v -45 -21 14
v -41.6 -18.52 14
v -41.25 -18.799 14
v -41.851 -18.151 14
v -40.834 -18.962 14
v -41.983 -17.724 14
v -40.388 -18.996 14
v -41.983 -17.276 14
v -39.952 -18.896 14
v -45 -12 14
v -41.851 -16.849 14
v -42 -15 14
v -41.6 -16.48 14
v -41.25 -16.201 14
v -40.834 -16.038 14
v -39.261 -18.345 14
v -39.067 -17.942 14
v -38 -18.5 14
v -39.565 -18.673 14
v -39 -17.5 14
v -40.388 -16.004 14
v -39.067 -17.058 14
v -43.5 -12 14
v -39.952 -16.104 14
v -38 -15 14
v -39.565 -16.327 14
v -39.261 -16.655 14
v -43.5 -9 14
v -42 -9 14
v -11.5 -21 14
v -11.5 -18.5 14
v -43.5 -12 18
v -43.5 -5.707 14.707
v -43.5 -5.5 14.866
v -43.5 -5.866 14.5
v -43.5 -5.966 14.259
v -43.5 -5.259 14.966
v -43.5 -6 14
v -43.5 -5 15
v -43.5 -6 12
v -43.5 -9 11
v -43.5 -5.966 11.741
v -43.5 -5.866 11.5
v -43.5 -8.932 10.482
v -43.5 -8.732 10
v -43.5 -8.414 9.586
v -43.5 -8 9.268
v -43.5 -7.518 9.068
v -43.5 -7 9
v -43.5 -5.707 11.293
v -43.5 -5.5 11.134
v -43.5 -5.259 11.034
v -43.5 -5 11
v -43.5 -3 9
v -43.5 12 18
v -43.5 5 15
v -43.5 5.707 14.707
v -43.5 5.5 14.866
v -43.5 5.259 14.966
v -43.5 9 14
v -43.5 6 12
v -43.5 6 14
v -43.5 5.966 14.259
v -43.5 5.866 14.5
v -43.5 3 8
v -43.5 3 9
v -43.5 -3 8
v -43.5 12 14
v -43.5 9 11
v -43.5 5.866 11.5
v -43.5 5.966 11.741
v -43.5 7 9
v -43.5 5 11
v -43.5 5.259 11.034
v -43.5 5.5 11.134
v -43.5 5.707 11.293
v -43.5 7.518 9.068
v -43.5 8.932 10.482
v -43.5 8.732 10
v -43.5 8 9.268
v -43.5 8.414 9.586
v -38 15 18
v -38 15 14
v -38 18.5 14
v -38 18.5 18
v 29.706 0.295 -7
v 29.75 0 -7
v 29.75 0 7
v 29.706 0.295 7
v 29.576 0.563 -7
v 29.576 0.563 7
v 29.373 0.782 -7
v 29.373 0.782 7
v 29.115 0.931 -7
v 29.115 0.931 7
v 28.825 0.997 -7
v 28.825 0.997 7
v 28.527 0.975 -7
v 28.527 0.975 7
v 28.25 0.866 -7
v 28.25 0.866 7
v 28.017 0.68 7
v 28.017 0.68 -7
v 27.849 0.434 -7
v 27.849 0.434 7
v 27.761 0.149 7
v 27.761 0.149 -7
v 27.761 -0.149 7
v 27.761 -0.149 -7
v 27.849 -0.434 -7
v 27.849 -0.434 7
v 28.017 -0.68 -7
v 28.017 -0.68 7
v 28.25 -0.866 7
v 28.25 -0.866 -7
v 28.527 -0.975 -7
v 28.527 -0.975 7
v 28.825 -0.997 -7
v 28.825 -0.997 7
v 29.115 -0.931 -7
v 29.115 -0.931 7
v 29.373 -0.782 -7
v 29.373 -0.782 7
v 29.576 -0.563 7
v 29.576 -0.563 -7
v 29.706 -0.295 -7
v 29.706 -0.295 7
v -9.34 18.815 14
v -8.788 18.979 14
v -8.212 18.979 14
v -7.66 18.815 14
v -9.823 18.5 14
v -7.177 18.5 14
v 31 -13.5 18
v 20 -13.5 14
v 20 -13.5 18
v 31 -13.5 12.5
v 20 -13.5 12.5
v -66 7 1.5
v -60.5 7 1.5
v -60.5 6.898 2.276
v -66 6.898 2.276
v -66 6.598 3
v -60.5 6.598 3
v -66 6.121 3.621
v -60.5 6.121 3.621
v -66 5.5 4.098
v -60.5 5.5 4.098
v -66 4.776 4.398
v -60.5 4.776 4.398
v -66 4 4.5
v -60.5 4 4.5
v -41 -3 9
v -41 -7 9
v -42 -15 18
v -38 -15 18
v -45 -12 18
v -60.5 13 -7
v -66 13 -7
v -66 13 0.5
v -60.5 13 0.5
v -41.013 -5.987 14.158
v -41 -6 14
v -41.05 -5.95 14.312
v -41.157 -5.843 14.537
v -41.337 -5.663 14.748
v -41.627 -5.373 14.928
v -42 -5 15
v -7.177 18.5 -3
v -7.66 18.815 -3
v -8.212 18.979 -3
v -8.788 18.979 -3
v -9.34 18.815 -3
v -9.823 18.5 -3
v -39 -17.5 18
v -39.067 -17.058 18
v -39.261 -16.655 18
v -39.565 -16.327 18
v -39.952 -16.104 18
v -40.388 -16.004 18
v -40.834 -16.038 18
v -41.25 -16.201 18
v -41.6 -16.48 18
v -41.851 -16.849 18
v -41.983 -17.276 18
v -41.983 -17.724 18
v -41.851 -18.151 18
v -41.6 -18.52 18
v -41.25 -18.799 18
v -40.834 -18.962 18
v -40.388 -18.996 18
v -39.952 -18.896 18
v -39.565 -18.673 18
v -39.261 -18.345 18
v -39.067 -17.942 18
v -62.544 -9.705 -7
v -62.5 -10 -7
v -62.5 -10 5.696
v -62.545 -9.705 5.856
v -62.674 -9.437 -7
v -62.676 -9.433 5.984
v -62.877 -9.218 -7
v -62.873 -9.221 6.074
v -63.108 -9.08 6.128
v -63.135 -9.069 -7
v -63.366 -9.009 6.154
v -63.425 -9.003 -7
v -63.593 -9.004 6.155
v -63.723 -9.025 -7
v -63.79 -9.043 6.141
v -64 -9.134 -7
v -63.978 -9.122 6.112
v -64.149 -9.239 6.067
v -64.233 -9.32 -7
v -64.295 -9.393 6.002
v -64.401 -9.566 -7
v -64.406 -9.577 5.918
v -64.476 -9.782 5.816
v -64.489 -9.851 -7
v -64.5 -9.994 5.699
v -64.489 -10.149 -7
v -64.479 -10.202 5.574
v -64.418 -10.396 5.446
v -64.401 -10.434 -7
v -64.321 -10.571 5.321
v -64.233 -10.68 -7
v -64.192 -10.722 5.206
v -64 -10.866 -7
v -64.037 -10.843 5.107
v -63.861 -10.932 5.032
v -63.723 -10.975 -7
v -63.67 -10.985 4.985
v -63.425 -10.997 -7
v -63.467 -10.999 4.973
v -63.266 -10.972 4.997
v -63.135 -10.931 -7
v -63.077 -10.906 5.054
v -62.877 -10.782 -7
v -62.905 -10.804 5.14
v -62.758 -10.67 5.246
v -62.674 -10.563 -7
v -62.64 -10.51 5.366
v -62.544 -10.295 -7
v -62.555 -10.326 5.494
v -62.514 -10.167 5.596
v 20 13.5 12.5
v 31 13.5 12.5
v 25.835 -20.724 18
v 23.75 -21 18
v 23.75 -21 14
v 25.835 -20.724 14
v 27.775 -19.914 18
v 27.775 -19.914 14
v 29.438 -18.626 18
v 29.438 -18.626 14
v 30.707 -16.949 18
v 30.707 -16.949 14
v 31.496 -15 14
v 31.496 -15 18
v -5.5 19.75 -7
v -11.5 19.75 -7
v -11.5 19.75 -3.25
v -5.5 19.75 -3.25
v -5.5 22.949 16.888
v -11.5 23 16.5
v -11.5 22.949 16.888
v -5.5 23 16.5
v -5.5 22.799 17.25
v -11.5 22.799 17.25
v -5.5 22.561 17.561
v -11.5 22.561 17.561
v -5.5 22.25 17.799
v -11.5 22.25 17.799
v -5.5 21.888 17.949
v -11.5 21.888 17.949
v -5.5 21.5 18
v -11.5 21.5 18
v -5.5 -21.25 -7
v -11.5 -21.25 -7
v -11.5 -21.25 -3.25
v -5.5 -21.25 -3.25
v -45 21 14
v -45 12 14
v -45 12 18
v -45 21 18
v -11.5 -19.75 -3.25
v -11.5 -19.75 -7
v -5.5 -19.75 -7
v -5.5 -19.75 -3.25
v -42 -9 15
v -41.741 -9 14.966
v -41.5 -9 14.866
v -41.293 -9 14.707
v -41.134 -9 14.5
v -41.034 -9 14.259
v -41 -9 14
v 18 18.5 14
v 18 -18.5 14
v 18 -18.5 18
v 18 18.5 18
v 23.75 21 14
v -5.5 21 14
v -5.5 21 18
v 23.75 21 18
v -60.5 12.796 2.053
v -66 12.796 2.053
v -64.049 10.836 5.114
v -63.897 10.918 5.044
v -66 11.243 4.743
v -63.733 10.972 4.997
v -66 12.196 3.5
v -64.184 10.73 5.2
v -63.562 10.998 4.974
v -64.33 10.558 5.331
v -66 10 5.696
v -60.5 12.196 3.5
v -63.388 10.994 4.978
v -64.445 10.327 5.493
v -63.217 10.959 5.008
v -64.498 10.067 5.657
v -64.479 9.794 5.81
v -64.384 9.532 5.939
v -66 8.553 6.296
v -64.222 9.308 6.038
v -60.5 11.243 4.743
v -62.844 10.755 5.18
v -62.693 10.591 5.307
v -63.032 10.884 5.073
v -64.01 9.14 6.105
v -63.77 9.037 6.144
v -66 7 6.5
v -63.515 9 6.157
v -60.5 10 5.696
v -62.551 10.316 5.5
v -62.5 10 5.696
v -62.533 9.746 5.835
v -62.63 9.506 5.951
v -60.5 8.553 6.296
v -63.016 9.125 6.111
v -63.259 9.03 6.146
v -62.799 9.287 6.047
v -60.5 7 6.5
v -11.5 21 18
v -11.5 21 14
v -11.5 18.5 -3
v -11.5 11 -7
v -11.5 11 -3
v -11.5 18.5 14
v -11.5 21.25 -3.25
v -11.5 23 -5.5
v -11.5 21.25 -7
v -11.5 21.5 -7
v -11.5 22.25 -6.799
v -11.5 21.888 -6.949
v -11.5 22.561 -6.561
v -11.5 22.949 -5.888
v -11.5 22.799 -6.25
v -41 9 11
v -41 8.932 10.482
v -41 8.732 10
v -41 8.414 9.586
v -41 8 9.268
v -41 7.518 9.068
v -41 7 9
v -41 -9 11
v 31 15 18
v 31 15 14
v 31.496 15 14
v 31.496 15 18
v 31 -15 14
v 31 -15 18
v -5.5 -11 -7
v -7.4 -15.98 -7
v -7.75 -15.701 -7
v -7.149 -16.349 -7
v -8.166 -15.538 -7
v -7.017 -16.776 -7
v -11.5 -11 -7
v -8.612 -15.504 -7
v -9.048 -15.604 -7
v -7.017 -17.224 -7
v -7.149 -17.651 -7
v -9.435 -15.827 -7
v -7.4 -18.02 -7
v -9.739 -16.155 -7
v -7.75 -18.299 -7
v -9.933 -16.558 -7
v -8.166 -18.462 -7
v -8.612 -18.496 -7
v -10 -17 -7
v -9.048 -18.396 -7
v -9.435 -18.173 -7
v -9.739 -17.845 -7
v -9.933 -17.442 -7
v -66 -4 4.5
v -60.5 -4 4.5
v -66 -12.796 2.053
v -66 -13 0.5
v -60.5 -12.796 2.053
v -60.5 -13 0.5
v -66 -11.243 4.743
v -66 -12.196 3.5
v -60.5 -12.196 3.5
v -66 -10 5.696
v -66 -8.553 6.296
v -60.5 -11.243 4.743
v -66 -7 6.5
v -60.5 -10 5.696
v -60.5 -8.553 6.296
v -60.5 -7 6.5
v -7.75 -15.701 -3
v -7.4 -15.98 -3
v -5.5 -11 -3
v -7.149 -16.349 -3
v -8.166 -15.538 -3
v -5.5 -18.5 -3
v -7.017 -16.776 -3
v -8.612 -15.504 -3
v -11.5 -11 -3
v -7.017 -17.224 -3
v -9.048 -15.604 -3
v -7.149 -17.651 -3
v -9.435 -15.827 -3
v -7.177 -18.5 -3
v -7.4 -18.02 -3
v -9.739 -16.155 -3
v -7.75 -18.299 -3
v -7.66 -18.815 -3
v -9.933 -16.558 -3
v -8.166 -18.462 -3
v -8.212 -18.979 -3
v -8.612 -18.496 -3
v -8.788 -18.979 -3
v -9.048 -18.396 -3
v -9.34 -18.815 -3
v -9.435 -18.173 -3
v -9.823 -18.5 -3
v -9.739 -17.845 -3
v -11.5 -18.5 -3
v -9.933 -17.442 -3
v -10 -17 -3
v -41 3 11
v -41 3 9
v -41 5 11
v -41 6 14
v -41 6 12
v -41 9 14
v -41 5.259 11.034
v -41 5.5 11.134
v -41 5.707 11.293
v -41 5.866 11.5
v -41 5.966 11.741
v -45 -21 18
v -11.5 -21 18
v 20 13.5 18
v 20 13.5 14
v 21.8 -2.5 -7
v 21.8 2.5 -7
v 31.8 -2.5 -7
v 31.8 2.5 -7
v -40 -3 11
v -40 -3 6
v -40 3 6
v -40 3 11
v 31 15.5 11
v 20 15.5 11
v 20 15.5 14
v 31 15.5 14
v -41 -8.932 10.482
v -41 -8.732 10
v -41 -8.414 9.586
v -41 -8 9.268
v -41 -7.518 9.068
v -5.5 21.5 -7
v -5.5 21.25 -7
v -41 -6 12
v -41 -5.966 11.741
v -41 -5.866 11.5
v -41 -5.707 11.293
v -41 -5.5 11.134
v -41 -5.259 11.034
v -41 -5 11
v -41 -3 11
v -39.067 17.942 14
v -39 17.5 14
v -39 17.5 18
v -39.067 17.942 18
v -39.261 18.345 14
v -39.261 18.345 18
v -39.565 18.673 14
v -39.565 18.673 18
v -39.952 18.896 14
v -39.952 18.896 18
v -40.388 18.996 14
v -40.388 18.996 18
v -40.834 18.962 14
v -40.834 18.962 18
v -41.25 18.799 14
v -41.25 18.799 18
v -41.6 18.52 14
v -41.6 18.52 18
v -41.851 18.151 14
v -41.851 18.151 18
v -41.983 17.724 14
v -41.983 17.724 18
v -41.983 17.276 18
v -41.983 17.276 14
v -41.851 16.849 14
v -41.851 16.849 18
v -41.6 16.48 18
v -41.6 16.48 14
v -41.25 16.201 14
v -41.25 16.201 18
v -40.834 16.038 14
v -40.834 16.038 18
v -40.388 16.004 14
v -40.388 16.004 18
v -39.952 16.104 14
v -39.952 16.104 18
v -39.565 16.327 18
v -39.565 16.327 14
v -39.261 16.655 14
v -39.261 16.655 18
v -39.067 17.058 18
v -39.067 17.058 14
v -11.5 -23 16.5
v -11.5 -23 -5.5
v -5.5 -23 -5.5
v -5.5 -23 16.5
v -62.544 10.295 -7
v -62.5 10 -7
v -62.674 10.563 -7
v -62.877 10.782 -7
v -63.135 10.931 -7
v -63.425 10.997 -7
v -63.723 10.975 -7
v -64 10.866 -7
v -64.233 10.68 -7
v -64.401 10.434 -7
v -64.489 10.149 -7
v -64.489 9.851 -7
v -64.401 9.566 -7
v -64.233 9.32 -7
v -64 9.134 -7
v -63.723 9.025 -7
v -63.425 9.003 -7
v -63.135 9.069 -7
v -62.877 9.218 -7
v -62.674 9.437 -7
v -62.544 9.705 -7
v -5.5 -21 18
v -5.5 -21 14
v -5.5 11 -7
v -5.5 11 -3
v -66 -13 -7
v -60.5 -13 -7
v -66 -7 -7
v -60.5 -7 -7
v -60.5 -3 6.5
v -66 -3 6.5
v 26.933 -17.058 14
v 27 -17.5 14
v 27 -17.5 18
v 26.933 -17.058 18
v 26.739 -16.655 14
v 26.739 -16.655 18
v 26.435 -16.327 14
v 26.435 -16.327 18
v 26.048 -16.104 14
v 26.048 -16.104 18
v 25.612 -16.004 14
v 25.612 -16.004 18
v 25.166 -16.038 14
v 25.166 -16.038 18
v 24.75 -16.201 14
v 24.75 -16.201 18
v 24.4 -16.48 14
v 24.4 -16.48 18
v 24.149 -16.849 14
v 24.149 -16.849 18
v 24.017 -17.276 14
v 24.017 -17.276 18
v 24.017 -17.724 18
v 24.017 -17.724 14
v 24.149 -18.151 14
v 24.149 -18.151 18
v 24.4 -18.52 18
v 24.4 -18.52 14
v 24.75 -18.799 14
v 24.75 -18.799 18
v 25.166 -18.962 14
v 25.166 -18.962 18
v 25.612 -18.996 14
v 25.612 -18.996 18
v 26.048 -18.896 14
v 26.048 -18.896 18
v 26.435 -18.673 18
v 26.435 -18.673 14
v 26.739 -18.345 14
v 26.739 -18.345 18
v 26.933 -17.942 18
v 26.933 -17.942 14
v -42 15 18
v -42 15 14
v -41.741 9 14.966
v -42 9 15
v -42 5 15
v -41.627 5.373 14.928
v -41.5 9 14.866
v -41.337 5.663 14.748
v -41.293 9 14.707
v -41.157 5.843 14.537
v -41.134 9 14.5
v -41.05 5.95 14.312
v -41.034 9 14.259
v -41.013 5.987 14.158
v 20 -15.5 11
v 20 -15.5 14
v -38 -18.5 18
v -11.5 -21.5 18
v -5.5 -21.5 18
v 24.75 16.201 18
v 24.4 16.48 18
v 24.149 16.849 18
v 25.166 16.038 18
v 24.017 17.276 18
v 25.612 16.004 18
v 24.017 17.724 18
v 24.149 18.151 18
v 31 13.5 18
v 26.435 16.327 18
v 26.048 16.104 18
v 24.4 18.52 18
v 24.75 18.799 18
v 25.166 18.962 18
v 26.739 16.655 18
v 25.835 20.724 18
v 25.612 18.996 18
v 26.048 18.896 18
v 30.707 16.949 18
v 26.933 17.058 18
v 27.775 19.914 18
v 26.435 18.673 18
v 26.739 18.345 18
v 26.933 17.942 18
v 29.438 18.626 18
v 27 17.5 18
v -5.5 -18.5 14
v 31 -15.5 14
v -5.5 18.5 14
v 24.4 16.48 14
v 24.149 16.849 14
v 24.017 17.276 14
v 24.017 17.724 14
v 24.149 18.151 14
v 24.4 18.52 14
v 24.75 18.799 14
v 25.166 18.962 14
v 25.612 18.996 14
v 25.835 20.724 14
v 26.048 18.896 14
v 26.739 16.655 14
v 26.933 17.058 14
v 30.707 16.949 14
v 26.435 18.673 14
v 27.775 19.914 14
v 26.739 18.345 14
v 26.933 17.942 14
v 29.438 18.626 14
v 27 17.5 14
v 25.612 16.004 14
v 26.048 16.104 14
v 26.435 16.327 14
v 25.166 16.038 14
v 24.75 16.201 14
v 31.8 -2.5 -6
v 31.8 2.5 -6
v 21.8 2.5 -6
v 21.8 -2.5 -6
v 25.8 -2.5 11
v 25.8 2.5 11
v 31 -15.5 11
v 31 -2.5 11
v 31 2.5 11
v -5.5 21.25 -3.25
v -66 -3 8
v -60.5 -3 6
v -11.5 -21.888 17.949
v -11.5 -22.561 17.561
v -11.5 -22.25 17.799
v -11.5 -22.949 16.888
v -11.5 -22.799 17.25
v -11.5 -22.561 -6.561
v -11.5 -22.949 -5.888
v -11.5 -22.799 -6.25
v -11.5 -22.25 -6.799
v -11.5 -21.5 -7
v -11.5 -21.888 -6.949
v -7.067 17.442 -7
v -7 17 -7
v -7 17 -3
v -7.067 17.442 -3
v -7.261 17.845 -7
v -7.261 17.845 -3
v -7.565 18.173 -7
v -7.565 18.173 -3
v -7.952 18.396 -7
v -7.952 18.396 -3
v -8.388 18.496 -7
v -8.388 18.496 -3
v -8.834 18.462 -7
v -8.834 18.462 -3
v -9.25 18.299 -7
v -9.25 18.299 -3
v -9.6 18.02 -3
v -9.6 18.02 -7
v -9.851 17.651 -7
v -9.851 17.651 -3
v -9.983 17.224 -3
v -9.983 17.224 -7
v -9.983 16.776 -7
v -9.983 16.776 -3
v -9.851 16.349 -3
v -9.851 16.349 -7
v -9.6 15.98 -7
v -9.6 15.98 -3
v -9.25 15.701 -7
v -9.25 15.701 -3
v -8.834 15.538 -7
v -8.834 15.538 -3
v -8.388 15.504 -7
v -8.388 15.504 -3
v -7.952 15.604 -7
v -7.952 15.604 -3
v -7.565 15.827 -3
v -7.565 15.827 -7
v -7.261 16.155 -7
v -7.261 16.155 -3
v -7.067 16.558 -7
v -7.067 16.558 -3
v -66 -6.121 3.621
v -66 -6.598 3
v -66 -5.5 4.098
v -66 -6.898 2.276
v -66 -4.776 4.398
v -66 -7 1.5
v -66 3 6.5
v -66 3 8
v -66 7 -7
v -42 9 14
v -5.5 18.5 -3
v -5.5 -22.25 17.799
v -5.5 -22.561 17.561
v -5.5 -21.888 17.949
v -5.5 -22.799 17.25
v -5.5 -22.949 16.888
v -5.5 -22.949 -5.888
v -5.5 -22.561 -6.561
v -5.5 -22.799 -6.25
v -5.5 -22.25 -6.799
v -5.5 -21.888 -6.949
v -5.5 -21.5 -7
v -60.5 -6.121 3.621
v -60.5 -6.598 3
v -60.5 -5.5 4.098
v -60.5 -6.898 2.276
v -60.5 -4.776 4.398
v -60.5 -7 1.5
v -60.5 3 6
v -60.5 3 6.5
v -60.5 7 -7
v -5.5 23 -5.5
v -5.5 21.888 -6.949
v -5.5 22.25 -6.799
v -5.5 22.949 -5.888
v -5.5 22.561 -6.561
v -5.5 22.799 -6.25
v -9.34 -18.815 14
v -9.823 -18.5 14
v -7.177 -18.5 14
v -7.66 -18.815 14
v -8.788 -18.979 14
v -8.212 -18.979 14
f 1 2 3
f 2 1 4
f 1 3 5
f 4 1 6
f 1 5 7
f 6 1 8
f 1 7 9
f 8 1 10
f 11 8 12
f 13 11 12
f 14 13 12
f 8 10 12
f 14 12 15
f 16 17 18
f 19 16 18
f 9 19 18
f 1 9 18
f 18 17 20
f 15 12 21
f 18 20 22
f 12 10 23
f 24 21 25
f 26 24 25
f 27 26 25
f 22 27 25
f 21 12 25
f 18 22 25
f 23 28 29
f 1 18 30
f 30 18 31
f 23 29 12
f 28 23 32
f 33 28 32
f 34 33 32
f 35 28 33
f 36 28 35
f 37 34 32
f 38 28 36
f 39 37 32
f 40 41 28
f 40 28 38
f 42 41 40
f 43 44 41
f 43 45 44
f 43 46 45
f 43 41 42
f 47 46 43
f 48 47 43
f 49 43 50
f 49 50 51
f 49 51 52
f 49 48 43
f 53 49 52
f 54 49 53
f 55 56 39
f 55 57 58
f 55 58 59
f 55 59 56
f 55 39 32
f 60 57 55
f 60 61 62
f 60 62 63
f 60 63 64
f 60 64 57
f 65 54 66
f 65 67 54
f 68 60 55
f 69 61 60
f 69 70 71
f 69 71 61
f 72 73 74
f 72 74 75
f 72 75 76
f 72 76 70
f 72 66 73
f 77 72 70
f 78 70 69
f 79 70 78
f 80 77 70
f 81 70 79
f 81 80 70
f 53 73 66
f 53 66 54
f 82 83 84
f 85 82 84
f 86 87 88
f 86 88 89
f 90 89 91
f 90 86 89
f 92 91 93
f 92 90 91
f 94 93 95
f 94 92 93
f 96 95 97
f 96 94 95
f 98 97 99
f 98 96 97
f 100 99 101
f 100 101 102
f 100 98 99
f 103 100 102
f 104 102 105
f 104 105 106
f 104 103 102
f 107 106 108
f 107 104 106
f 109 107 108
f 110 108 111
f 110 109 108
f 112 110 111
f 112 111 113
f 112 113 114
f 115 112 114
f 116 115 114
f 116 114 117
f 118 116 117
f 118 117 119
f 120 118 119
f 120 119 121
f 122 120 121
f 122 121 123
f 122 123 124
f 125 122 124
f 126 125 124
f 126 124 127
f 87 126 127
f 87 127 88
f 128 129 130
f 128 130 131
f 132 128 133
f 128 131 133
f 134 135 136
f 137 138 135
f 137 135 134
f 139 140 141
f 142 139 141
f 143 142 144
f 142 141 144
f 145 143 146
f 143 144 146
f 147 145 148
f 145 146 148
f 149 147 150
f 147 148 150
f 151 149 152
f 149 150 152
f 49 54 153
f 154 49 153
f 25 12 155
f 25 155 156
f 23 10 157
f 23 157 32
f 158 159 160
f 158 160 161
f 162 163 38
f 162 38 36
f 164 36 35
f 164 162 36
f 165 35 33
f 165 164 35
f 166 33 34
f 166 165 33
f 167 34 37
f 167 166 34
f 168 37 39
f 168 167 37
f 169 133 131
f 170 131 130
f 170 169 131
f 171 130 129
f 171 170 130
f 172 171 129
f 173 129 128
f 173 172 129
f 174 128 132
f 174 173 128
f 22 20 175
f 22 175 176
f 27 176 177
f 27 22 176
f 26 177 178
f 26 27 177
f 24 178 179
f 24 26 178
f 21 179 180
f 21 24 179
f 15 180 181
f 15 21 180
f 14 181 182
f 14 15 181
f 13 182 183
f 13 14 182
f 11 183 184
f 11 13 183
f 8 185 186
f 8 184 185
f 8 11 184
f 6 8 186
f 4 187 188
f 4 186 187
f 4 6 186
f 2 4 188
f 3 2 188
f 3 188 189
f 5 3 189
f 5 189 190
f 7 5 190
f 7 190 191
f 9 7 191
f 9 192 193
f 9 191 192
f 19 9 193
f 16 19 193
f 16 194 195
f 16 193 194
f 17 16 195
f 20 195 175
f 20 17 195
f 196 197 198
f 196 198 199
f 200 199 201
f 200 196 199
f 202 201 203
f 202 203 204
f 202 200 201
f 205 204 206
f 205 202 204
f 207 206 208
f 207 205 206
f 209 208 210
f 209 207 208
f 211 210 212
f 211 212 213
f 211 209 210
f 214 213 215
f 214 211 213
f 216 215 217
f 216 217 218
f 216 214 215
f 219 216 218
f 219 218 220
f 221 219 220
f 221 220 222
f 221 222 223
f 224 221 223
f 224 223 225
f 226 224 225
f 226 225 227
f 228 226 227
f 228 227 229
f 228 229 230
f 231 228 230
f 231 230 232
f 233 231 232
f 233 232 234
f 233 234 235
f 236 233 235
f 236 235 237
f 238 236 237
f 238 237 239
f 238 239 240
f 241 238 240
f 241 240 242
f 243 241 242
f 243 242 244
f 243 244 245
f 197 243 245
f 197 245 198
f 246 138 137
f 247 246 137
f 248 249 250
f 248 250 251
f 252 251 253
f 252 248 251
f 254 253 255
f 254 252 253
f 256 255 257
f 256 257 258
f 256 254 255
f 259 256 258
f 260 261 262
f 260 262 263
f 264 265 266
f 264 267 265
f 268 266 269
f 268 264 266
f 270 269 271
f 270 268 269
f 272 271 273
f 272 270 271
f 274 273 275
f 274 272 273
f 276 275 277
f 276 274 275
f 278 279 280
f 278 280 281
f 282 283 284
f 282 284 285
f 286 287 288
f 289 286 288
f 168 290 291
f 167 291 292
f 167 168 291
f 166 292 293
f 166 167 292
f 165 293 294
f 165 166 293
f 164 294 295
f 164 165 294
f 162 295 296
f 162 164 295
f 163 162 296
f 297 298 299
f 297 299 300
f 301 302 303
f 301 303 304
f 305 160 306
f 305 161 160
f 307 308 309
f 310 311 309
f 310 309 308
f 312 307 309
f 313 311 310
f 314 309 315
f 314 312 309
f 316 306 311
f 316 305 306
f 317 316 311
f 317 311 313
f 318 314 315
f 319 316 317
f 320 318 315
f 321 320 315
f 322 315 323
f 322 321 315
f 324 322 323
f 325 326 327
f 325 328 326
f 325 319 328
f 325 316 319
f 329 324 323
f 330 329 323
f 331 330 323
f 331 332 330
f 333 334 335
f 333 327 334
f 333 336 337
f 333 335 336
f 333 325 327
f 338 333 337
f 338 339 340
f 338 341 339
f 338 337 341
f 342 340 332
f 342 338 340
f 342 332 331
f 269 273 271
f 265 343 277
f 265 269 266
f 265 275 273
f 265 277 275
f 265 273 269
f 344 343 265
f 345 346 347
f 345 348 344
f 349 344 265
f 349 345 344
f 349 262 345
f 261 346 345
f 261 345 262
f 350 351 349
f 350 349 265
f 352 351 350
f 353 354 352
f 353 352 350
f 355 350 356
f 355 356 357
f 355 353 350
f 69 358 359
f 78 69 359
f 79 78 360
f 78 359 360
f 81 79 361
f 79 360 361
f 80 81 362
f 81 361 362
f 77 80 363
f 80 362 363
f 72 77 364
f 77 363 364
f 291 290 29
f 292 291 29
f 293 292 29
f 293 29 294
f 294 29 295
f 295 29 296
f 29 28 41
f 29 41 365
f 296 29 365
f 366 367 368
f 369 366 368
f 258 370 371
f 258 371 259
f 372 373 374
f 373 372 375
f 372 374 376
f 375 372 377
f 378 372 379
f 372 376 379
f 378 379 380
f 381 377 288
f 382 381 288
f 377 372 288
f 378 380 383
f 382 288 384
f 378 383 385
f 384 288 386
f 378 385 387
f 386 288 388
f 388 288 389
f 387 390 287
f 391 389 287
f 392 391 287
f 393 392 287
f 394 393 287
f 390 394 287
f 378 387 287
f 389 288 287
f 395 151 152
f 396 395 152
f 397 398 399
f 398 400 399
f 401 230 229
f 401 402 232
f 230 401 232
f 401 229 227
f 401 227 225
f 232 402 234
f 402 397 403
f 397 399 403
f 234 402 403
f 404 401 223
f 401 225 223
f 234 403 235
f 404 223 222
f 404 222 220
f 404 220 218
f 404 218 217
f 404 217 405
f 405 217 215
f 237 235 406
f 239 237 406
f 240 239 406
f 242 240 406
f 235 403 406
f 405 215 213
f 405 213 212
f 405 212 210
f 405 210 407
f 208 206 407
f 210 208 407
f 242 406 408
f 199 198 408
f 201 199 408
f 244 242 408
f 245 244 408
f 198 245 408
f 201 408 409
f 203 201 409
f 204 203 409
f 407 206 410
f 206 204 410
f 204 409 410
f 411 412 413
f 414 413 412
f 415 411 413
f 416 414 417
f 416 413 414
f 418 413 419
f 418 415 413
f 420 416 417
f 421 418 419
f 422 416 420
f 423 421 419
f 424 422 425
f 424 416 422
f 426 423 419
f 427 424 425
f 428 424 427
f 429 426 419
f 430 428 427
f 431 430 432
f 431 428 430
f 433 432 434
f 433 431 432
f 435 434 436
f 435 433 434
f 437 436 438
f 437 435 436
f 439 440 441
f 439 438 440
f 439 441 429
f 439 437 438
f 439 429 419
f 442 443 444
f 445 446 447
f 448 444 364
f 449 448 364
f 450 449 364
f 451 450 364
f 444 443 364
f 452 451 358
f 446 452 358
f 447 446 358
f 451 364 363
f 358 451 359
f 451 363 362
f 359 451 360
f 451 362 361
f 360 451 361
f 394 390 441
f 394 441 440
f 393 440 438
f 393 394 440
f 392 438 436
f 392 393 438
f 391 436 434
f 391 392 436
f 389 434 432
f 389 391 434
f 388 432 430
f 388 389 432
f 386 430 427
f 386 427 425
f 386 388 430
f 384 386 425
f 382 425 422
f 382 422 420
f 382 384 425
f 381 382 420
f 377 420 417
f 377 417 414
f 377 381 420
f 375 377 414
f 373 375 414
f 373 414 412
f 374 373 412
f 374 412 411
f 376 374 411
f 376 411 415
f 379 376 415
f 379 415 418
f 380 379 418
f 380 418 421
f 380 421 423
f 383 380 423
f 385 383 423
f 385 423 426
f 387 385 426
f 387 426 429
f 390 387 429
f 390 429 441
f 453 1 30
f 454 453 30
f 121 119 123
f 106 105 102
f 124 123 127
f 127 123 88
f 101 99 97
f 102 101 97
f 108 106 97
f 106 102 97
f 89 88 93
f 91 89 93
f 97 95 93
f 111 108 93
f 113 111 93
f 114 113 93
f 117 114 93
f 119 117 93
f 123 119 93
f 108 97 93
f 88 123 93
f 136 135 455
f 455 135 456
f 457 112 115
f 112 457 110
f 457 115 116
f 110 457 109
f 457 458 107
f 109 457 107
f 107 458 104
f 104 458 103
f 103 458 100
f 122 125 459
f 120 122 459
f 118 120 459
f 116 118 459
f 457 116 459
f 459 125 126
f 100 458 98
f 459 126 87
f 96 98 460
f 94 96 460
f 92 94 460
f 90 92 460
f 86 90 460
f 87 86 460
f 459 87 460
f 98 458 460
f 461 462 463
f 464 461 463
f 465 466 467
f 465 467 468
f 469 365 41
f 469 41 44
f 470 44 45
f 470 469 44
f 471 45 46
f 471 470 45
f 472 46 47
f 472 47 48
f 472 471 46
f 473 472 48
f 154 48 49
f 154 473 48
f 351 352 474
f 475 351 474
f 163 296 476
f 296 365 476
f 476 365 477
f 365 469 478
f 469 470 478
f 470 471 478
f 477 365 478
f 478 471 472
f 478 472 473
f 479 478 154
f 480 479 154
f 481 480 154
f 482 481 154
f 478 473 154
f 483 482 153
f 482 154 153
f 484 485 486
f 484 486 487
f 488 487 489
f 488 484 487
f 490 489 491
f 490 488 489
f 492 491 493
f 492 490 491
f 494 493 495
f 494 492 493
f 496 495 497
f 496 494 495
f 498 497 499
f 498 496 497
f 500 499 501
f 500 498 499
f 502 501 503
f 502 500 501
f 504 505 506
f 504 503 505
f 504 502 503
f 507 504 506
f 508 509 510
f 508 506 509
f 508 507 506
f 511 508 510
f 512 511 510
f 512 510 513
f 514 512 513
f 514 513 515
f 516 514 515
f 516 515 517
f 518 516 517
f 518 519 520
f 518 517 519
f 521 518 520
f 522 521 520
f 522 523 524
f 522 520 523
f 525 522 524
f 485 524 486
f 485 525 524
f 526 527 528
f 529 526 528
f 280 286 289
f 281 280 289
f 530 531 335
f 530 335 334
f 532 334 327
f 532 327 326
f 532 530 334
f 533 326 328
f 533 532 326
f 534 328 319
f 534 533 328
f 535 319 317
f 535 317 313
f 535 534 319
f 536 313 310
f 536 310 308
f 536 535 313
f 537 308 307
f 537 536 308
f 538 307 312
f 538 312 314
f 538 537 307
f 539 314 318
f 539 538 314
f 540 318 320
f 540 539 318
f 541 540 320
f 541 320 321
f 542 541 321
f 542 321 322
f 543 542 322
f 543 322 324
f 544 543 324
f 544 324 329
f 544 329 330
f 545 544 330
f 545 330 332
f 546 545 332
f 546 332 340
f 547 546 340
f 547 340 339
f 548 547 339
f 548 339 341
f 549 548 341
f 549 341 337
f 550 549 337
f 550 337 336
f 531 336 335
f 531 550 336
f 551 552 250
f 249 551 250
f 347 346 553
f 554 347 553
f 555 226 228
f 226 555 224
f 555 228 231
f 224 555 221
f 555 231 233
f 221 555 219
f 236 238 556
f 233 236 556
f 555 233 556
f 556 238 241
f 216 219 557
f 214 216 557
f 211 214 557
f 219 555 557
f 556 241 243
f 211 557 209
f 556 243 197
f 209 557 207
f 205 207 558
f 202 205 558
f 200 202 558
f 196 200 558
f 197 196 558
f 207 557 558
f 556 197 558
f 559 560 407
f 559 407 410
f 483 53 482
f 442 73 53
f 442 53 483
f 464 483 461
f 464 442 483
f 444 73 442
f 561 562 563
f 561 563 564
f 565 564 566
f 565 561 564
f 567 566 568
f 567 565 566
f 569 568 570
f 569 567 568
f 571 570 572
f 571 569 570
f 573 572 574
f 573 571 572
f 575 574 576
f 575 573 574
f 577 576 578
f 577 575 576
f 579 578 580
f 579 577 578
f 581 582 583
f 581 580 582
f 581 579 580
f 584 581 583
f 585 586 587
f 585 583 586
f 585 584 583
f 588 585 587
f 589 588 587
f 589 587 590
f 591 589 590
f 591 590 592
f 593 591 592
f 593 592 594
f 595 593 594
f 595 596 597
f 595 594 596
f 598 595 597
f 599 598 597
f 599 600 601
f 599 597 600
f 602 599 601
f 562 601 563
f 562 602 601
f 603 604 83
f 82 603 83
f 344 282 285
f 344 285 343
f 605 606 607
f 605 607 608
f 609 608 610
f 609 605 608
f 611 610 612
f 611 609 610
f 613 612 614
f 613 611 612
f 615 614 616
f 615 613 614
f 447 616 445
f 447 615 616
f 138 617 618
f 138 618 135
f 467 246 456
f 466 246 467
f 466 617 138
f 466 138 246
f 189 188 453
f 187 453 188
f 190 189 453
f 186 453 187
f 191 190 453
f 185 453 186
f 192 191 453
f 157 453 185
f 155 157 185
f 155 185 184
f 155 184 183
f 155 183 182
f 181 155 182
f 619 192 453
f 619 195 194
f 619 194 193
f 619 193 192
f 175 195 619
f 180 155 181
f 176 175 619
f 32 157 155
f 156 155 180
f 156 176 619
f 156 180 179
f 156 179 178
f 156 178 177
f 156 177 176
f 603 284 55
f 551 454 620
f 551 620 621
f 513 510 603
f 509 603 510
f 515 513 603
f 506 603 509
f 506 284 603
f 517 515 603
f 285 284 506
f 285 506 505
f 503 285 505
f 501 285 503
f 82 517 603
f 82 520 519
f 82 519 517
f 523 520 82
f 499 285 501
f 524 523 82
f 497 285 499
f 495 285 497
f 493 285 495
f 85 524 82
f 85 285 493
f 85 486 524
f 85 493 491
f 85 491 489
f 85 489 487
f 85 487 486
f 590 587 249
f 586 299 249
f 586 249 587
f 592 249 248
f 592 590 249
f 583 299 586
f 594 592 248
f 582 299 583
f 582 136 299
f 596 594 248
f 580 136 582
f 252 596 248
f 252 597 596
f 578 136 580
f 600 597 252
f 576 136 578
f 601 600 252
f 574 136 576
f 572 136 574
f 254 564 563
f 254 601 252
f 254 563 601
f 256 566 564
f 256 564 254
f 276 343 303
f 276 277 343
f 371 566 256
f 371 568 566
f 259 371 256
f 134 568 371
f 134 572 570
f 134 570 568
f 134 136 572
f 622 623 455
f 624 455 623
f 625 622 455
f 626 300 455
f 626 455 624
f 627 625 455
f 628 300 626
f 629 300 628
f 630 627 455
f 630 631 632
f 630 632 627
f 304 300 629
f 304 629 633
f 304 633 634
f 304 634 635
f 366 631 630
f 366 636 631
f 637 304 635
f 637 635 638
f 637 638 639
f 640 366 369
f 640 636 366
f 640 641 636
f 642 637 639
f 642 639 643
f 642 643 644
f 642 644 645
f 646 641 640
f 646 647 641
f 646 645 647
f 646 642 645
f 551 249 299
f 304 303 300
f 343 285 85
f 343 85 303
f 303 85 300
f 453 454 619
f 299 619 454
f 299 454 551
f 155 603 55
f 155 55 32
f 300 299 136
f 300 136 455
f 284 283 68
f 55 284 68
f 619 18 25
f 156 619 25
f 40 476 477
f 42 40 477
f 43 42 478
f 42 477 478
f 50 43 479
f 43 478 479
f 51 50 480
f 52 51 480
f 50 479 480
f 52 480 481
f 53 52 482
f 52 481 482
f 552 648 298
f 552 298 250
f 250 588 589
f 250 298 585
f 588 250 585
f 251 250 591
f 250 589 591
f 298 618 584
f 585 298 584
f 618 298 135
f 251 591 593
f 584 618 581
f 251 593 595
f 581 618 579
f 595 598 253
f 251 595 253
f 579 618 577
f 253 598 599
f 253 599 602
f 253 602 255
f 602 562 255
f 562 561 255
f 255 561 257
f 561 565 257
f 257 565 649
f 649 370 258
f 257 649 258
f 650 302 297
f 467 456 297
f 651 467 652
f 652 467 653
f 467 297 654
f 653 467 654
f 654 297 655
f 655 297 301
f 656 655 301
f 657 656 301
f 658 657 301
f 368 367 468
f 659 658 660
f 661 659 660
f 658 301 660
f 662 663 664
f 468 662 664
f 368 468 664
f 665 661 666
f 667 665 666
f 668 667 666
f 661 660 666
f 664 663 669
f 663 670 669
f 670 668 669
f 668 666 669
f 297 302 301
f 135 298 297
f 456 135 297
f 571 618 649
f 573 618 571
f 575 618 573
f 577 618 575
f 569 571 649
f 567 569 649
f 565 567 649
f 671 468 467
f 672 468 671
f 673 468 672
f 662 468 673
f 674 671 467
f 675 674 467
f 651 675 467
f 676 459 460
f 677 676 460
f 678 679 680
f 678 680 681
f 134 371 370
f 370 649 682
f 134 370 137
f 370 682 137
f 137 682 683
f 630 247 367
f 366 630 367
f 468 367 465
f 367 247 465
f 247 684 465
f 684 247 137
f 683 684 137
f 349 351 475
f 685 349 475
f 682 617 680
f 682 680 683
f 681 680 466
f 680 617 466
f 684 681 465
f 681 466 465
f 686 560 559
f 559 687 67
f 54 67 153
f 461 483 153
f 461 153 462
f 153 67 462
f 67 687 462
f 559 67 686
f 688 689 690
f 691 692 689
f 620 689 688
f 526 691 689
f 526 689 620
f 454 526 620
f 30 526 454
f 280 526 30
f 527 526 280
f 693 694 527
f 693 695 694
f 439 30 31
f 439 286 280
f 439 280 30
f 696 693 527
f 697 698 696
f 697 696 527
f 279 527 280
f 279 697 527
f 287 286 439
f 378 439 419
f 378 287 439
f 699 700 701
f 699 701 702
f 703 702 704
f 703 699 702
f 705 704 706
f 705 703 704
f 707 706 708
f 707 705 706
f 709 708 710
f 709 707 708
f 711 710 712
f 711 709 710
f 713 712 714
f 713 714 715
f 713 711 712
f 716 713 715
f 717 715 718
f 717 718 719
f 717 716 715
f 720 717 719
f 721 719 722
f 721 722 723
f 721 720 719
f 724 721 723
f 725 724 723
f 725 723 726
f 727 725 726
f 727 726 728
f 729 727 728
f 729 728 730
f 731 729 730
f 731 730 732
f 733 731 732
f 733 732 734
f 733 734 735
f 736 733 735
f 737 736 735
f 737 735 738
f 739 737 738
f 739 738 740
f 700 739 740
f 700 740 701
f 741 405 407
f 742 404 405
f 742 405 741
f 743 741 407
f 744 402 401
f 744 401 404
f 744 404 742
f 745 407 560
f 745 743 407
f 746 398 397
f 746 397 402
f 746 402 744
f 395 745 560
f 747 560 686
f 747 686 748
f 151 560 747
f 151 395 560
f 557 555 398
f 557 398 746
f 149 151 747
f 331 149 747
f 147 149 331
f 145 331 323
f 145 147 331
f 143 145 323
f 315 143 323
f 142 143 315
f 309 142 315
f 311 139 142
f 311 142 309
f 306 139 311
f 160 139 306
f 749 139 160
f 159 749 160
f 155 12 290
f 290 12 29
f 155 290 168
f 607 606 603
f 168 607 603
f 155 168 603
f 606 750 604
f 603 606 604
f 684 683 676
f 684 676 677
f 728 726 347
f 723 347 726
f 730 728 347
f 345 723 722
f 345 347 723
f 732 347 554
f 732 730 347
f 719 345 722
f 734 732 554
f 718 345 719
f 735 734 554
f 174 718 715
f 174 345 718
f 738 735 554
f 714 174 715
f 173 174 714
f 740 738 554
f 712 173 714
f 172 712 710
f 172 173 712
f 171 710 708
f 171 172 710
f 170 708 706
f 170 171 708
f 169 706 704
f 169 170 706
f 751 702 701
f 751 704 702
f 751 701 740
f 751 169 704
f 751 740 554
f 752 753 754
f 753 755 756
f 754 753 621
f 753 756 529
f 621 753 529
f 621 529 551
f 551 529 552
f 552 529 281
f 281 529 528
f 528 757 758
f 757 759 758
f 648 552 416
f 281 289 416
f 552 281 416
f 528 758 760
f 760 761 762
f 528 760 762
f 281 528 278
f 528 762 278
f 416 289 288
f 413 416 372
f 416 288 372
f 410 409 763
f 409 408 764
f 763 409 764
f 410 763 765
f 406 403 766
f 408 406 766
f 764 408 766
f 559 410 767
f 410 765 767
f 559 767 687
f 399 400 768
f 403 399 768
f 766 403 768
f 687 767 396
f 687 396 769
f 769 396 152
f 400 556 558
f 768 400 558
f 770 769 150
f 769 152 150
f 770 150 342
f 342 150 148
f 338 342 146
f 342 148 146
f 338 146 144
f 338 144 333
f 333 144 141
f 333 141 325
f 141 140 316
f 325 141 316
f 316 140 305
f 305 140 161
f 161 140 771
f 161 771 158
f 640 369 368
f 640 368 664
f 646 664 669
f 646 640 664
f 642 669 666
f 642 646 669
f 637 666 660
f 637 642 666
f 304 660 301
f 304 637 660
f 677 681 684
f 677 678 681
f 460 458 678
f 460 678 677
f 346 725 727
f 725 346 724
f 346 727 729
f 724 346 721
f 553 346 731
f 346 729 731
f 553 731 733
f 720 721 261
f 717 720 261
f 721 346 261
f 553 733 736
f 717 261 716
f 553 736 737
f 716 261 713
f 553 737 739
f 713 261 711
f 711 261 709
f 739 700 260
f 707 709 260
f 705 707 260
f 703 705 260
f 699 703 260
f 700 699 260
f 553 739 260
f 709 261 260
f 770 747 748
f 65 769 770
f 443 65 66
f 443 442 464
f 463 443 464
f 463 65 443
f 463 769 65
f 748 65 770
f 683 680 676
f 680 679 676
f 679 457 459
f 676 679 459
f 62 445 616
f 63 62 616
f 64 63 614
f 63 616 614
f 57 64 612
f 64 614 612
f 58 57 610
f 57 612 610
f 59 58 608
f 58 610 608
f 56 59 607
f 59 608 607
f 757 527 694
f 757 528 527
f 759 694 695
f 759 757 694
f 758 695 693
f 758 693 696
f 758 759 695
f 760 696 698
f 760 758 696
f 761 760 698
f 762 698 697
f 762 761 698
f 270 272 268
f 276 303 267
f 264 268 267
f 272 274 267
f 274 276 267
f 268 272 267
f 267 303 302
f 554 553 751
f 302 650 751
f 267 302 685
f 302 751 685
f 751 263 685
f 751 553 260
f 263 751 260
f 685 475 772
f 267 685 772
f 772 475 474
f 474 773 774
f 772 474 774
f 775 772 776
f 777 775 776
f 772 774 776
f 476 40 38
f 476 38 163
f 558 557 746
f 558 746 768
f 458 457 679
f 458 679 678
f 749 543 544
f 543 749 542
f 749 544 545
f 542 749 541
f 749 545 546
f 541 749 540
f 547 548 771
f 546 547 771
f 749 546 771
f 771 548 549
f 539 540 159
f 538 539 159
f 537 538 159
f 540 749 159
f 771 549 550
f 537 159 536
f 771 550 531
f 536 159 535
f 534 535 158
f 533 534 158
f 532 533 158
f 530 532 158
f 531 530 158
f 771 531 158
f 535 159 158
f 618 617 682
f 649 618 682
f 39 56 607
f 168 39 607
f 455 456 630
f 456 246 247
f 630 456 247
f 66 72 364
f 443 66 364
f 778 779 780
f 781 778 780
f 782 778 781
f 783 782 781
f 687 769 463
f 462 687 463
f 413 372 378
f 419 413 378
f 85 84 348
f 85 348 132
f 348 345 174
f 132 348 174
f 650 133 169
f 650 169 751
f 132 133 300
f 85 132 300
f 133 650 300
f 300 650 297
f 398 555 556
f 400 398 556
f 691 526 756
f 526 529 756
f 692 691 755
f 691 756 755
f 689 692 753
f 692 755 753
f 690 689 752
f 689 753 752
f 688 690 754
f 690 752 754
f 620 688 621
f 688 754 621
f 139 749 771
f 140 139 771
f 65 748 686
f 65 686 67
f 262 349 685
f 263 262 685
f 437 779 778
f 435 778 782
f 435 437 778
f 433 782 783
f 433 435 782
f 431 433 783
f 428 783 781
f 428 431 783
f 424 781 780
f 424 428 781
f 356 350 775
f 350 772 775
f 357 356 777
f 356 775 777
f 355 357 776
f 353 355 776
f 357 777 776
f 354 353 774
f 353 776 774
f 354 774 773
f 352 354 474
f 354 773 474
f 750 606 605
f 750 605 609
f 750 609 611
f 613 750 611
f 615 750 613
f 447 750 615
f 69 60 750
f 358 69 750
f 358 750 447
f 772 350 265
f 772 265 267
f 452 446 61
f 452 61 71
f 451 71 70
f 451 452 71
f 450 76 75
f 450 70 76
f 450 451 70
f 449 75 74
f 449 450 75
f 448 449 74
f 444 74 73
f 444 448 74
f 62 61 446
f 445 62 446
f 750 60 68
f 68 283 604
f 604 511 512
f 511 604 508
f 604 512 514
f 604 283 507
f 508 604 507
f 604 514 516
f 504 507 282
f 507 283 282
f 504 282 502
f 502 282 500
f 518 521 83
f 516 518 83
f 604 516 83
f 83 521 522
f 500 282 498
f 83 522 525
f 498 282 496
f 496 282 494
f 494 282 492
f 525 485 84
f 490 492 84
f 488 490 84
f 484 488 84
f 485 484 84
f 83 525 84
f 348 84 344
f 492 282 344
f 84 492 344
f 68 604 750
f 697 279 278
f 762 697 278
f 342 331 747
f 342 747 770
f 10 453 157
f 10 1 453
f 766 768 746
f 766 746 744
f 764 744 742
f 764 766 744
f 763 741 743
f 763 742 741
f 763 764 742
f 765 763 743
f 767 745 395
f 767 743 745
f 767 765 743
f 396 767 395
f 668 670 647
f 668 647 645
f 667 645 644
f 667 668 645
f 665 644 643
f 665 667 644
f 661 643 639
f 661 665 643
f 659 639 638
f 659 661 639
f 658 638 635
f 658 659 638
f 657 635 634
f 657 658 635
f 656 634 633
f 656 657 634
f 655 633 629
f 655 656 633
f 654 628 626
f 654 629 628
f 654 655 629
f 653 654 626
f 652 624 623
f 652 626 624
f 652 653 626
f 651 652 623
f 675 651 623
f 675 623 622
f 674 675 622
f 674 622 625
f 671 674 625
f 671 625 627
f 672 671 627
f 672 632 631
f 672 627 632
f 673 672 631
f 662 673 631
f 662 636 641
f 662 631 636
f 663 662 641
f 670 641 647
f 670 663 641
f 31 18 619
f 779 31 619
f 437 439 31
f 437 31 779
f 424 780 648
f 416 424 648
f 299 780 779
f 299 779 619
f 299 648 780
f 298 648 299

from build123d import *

# Parameters (mm, degrees)
BOX246_W               = 7
BOX246_H               = 1.5
BOX246_DEPTH           = 4.5
BOX244_W               = 7
BOX244_H               = 1.5
BOX244_DEPTH           = 4.5
BOX245_W               = 6
BOX245_H               = 2
BOX245_DEPTH           = 25
FILLET124_R            = 1.5
BOX243_W               = 6
BOX243_H               = 2
BOX243_DEPTH           = 25
FILLET125_R            = 1.5
BOX242_W               = 10
BOX242_H               = 24
BOX242_DEPTH           = 11
BOX148_W               = 10
BOX148_H               = 12
BOX148_DEPTH           = 4
FILLET092_R            = 1
CYLINDER225_R          = 1
CYLINDER225_DEPTH      = 17
BOX132_W               = 10
BOX132_H               = 5
BOX132_DEPTH           = 18
CHAMFER021_1_SIZE2     = 4
CHAMFER021_1_SIZE      = 17
CHAMFER021_2_SIZE2     = 0.8
CHAMFER021_2_SIZE      = 17
BOX116_W               = 56
BOX116_H               = 37
BOX116_DEPTH           = 6
BOX130_W               = 60
BOX130_H               = 30
BOX130_DEPTH           = 6
CYLINDER224_R          = 1.5
CYLINDER224_DEPTH      = 12
BOX131_W               = 12
BOX131_H               = 30
BOX131_DEPTH           = 6
CYLINDER222_R          = 1.5
CYLINDER222_DEPTH      = 12
CYLINDER221_R          = 1.5
CYLINDER221_DEPTH      = 12
CYLINDER223_R          = 1.5
CYLINDER223_DEPTH      = 12
BOX134_W               = 25
BOX134_H               = 45
BOX134_DEPTH           = 6
BOX097_W               = 100
BOX097_H               = 42
BOX097_DEPTH           = 4
FILLET082_R            = 8
CYLINDER226_R          = 1.5
CYLINDER226_DEPTH      = 21
BOX138_W               = 8
BOX138_H               = 10
BOX138_DEPTH           = 21
BOX137_W               = 8
BOX137_H               = 10
BOX137_DEPTH           = 21
CYLINDER228_R          = 2
CYLINDER228_DEPTH      = 21
BOX110_W               = 56
BOX110_H               = 1
BOX110_DEPTH           = 3
BOX136_W               = 6
BOX136_H               = 10
BOX136_DEPTH           = 21
CYLINDER227_R          = 1.5
CYLINDER227_DEPTH      = 21
BOX141_W               = 8
BOX141_H               = 10
BOX141_DEPTH           = 21
BOX140_W               = 8
BOX140_H               = 10
BOX140_DEPTH           = 21
CYLINDER229_R          = 2
CYLINDER229_DEPTH      = 21
BOX139_W               = 56
BOX139_H               = 1
BOX139_DEPTH           = 3
BOX142_W               = 6
BOX142_H               = 10
BOX142_DEPTH           = 21
CUT100_PLACEMENT_ANGLE = 180
BOX143_W               = 14
BOX143_H               = 27
BOX143_DEPTH           = 8
BOX144_W               = 11
BOX144_H               = 31
BOX144_DEPTH           = 7
CYLINDER233_R          = 1
CYLINDER233_DEPTH      = 19
CYLINDER232_R          = 1
CYLINDER232_DEPTH      = 19
BOX152_W               = 8.5
BOX152_H               = 14
BOX152_DEPTH           = 11.5
FILLET095_R            = 3
BOX151_W               = 5.5
BOX151_H               = 26
BOX151_DEPTH           = 13.5
FILLET093_R            = 6
BOX150_W               = 24
BOX150_H               = 6
BOX150_DEPTH           = 2
BOX147_W               = 4
BOX147_H               = 18
BOX147_DEPTH           = 6
FILLET090_R            = 2
BOX149_W               = 5
BOX149_H               = 6
BOX149_DEPTH           = 6
FILLET094_R            = 1


with BuildPart() as w_rfel232:
    # Box246 → Box246 (new body)
    with BuildSketch(Plane(origin=(-12, 19.75, -7.75), x_dir=(1, 0, 0), z_dir=(0, 0, 1))):
        with Locations((3.5, 0.75)):
            Rectangle(BOX246_W, BOX246_H)
    extrude(amount=BOX246_DEPTH)


with BuildPart() as fusion218:
    # Box244 → Box244 (new body)
    with BuildSketch(Plane(origin=(-12, -21.25, -7.75), x_dir=(1, 0, 0), z_dir=(0, 0, 1))):
        with Locations((3.5, 0.75)):
            Rectangle(BOX244_W, BOX244_H)
    extrude(amount=BOX244_DEPTH)

    # Fusion218: union Würfel232
    add(w_rfel232.part)


with BuildPart() as fillet124:
    # Box245 → Box245 (new body)
    with BuildSketch(Plane(origin=(-11.5, 21, -7), x_dir=(1, 0, 0), z_dir=(0, 0, 1))):
        with Locations((3, 1)):
            Rectangle(BOX245_W, BOX245_H)
    extrude(amount=BOX245_DEPTH)

    # Fillet124
    fillet124_edges = [fillet124.edges().sort_by_distance(p)[0] for p in [
        (-8.5, 23, -7),
        (-8.5, 23, 18),
    ]]
    fillet(fillet124_edges, radius=FILLET124_R)


with BuildPart() as fillet125:
    # Box243 → Box243 (new body)
    with BuildSketch(Plane(origin=(-11.5, -23, -7), x_dir=(1, 0, 0), z_dir=(0, 0, 1))):
        with Locations((3, 1)):
            Rectangle(BOX243_W, BOX243_H)
    extrude(amount=BOX243_DEPTH)

    # Fillet125
    fillet125_edges = [fillet125.edges().sort_by_distance(p)[0] for p in [
        (-8.5, -23, -7),
        (-8.5, -23, 18),
    ]]
    fillet(fillet125_edges, radius=FILLET125_R)


with BuildPart() as w_rfel228:
    # Box242 → Box242 (new body)
    with BuildSketch(Plane(origin=(-53.5, -12, 8), x_dir=(1, 0, 0), z_dir=(0, 0, 1))):
        with Locations((5, 12)):
            Rectangle(BOX242_W, BOX242_H)
    extrude(amount=BOX242_DEPTH)


with BuildPart() as fillet092:
    # Box148 → Box148 (new body)
    with BuildSketch(Plane(origin=(-51, -6, 12), x_dir=(1, 0, 0), z_dir=(0, 0, 1))):
        with Locations((5, 6)):
            Rectangle(BOX148_W, BOX148_H)
    extrude(amount=BOX148_DEPTH)

    # Fillet092
    fillet092_edges = [fillet092.edges().sort_by_distance(p)[0] for p in [
        (-46, -6, 12),
        (-46, -6, 16),
        (-46, 6, 12),
        (-46, 6, 16),
    ]]
    fillet(fillet092_edges, radius=FILLET092_R)


with BuildPart() as fillet092_1:
    # Fillet092 placement: moved
    add(fillet092.part.moved(Location((2, 0, -1))))


with BuildPart() as zylinder225:
    # Cylinder225 → Cylinder225 (new body)
    with BuildSketch(Plane(origin=(28.75, 0, -10), x_dir=(1, 0, 0), z_dir=(0, 0, 1))):
        Circle(CYLINDER225_R)
    extrude(amount=CYLINDER225_DEPTH)


with BuildPart() as cut098:
    # Box132 → Box132 (new body)
    with BuildSketch(Plane(origin=(21.8, -2.5, -7), x_dir=(1, 0, 0), z_dir=(0, 0, 1))):
        with Locations((5, 2.5)):
            Rectangle(BOX132_W, BOX132_H)
    extrude(amount=BOX132_DEPTH)

    # Chamfer021 1
    chamfer021_1_edges = [cut098.edges().sort_by_distance(p)[0] for p in [
        (21.8, 0, 11),
    ]]
    chamfer021_1_side = cut098.faces().sort_by_distance((21.8, 0, 2))[0]
    chamfer(chamfer021_1_edges, length=CHAMFER021_1_SIZE, length2=CHAMFER021_1_SIZE2, reference=chamfer021_1_side)

    # Chamfer021 2
    chamfer021_2_edges = [cut098.edges().sort_by_distance(p)[0] for p in [
        (31.8, 0, 11),
    ]]
    chamfer021_2_side = cut098.faces().sort_by_distance((31.8, 0, 2))[0]
    chamfer(chamfer021_2_edges, length=CHAMFER021_2_SIZE, length2=CHAMFER021_2_SIZE2, reference=chamfer021_2_side)

    # Cut098: cut Zylinder225
    add(zylinder225.part, mode=Mode.SUBTRACT)


with BuildPart() as w_rfel110:
    # Box116 → Box116 (new body)
    with BuildSketch(Plane(origin=(-38, -18.5, 13), x_dir=(1, 0, 0), z_dir=(0, 0, 1))):
        with Locations((28, 18.5)):
            Rectangle(BOX116_W, BOX116_H)
    extrude(amount=BOX116_DEPTH)


with BuildPart() as w_rfel120:
    # Box130 → Box130 (new body)
    with BuildSketch(Plane(origin=(-42, -15, 13), x_dir=(1, 0, 0), z_dir=(0, 0, 1))):
        with Locations((30, 15)):
            Rectangle(BOX130_W, BOX130_H)
    extrude(amount=BOX130_DEPTH)


with BuildPart() as zylinder224:
    # Cylinder224 → Cylinder224 (new body)
    with BuildSketch(Plane(origin=(25.5, 17.5, 8), x_dir=(1, 0, 0), z_dir=(0, 0, 1))):
        Circle(CYLINDER224_R)
    extrude(amount=CYLINDER224_DEPTH)


with BuildPart() as w_rfel121:
    # Box131 → Box131 (new body)
    with BuildSketch(Plane(origin=(20, -15, 13), x_dir=(1, 0, 0), z_dir=(0, 0, 1))):
        with Locations((6, 15)):
            Rectangle(BOX131_W, BOX131_H)
    extrude(amount=BOX131_DEPTH)


with BuildPart() as zylinder222:
    # Cylinder222 → Cylinder222 (new body)
    with BuildSketch(Plane(origin=(-40.5, -17.5, 8), x_dir=(1, 0, 0), z_dir=(0, 0, 1))):
        Circle(CYLINDER222_R)
    extrude(amount=CYLINDER222_DEPTH)


with BuildPart() as zylinder221:
    # Cylinder221 → Cylinder221 (new body)
    with BuildSketch(Plane(origin=(-40.5, 17.5, 8), x_dir=(1, 0, 0), z_dir=(0, 0, 1))):
        Circle(CYLINDER221_R)
    extrude(amount=CYLINDER221_DEPTH)


with BuildPart() as zylinder223:
    # Cylinder223 → Cylinder223 (new body)
    with BuildSketch(Plane(origin=(25.5, -17.5, 8), x_dir=(1, 0, 0), z_dir=(0, 0, 1))):
        Circle(CYLINDER223_R)
    extrude(amount=CYLINDER223_DEPTH)


with BuildPart() as fusion142:
    # Box134 → Box134 (new body)
    with BuildSketch(Plane(origin=(-70, -22.5, 13), x_dir=(1, 0, 0), z_dir=(0, 0, 1))):
        with Locations((12.5, 22.5)):
            Rectangle(BOX134_W, BOX134_H)
    extrude(amount=BOX134_DEPTH)

    # Fusion142: union Würfel110, Würfel120, Zylinder224, Würfel121, Zylinder222, Zylinder221, Zylinder223
    add(w_rfel110.part)
    add(w_rfel120.part)
    add(zylinder224.part)
    add(w_rfel121.part)
    add(zylinder222.part)
    add(zylinder221.part)
    add(zylinder223.part)


with BuildPart() as cut097:
    # Box097 → Box097 (new body)
    with BuildSketch(Plane(origin=(-68.25, -21, 14), x_dir=(1, 0, 0), z_dir=(0, 0, 1))):
        with Locations((50, 21)):
            Rectangle(BOX097_W, BOX097_H)
    extrude(amount=BOX097_DEPTH)

    # Fillet082
    fillet082_edges = [cut097.edges().sort_by_distance(p)[0] for p in [
        (-68.25, -21, 16),
        (-68.25, 21, 16),
        (31.75, -21, 16),
        (31.75, 21, 16),
    ]]
    fillet(fillet082_edges, radius=FILLET082_R)

    # Cut097: cut Fusion142
    add(fusion142.part, mode=Mode.SUBTRACT)


with BuildPart() as zylinder226:
    # Cylinder226 → Cylinder226 (new body)
    with BuildSketch(Plane(origin=(-8.5, 17, -10), x_dir=(1, 0, 0), z_dir=(0, 0, 1))):
        Circle(CYLINDER226_R)
    extrude(amount=CYLINDER226_DEPTH)


with BuildPart() as w_rfel128:
    # Box138 → Box138 (new body)
    with BuildSketch(Plane(origin=(-12.5, 8.5, -3), x_dir=(1, 0, 0), z_dir=(0, 0, 1))):
        with Locations((4, 5)):
            Rectangle(BOX138_W, BOX138_H)
    extrude(amount=BOX138_DEPTH)


with BuildPart() as w_rfel127:
    # Box137 → Box137 (new body)
    with BuildSketch(Plane(origin=(-12.5, 5.5, -3), x_dir=(1, 0, 0), z_dir=(0, 0, 1))):
        with Locations((4, 5)):
            Rectangle(BOX137_W, BOX137_H)
    extrude(amount=BOX137_DEPTH)


with BuildPart() as zylinder228:
    # Cylinder228 → Cylinder228 (new body)
    with BuildSketch(Plane(origin=(-8.5, 17, -3), x_dir=(1, 0, 0), z_dir=(0, 0, 1))):
        Circle(CYLINDER228_R)
    extrude(amount=CYLINDER228_DEPTH)


with BuildPart() as fusion144:
    # Box110 → Box110 (new body)
    with BuildSketch(Plane(origin=(-43.5, 20, -7), x_dir=(1, 0, 0), z_dir=(0, 0, 1))):
        with Locations((28, 0.5)):
            Rectangle(BOX110_W, BOX110_H)
    extrude(amount=BOX110_DEPTH)

    # Fusion144: union Zylinder226, Würfel128, Würfel127, Zylinder228
    add(zylinder226.part)
    add(w_rfel128.part)
    add(w_rfel127.part)
    add(zylinder228.part)


with BuildPart() as cut099:
    # Box136 → Box136 (new body)
    with BuildSketch(Plane(origin=(-11.5, 11, -7), x_dir=(1, 0, 0), z_dir=(0, 0, 1))):
        with Locations((3, 5)):
            Rectangle(BOX136_W, BOX136_H)
    extrude(amount=BOX136_DEPTH)

    # Cut099: cut Fusion144
    add(fusion144.part, mode=Mode.SUBTRACT)


with BuildPart() as zylinder227:
    # Cylinder227 → Cylinder227 (new body)
    with BuildSketch(Plane(origin=(-8.5, 17, -10), x_dir=(1, 0, 0), z_dir=(0, 0, 1))):
        Circle(CYLINDER227_R)
    extrude(amount=CYLINDER227_DEPTH)


with BuildPart() as w_rfel131:
    # Box141 → Box141 (new body)
    with BuildSketch(Plane(origin=(-12.5, 8.5, -3), x_dir=(1, 0, 0), z_dir=(0, 0, 1))):
        with Locations((4, 5)):
            Rectangle(BOX141_W, BOX141_H)
    extrude(amount=BOX141_DEPTH)


with BuildPart() as w_rfel130:
    # Box140 → Box140 (new body)
    with BuildSketch(Plane(origin=(-12.5, 5.5, -3), x_dir=(1, 0, 0), z_dir=(0, 0, 1))):
        with Locations((4, 5)):
            Rectangle(BOX140_W, BOX140_H)
    extrude(amount=BOX140_DEPTH)


with BuildPart() as zylinder229:
    # Cylinder229 → Cylinder229 (new body)
    with BuildSketch(Plane(origin=(-8.5, 17, -3), x_dir=(1, 0, 0), z_dir=(0, 0, 1))):
        Circle(CYLINDER229_R)
    extrude(amount=CYLINDER229_DEPTH)


with BuildPart() as fusion145:
    # Box139 → Box139 (new body)
    with BuildSketch(Plane(origin=(-43.5, 20, -7), x_dir=(1, 0, 0), z_dir=(0, 0, 1))):
        with Locations((28, 0.5)):
            Rectangle(BOX139_W, BOX139_H)
    extrude(amount=BOX139_DEPTH)

    # Fusion145: union Zylinder227, Würfel131, Würfel130, Zylinder229
    add(zylinder227.part)
    add(w_rfel131.part)
    add(w_rfel130.part)
    add(zylinder229.part)


with BuildPart() as cut100:
    # Box142 → Box142 (new body)
    with BuildSketch(Plane(origin=(-11.5, 11, -7), x_dir=(1, 0, 0), z_dir=(0, 0, 1))):
        with Locations((3, 5)):
            Rectangle(BOX142_W, BOX142_H)
    extrude(amount=BOX142_DEPTH)

    # Cut100: cut Fusion145
    add(fusion145.part, mode=Mode.SUBTRACT)


with BuildPart() as cut100_1:
    # Cut100 placement: moved
    add(cut100.part.moved(Location((-17, 0, 0))).rotate(Axis((-17, 0, 0), (0, 0, 1)), CUT100_PLACEMENT_ANGLE))


with BuildPart() as w_rfel133:
    # Box143 → Box143 (new body)
    with BuildSketch(Plane(origin=(19, -13.5, 12.5), x_dir=(1, 0, 0), z_dir=(0, 0, 1))):
        with Locations((7, 13.5)):
            Rectangle(BOX143_W, BOX143_H)
    extrude(amount=BOX143_DEPTH)


with BuildPart() as cut101:
    # Box144 → Box144 (new body)
    with BuildSketch(Plane(origin=(20, -15.5, 11), x_dir=(1, 0, 0), z_dir=(0, 0, 1))):
        with Locations((5.5, 15.5)):
            Rectangle(BOX144_W, BOX144_H)
    extrude(amount=BOX144_DEPTH)

    # Cut101: cut Würfel133
    add(w_rfel133.part, mode=Mode.SUBTRACT)


with BuildPart() as zylinder233:
    # Cylinder233 → Cylinder233 (new body)
    with BuildSketch(Plane(origin=(-63.5, 10, -10), x_dir=(1, 0, 0), z_dir=(0, 0, 1))):
        Circle(CYLINDER233_R)
    extrude(amount=CYLINDER233_DEPTH)


with BuildPart() as zylinder232:
    # Cylinder232 → Cylinder232 (new body)
    with BuildSketch(Plane(origin=(-63.5, -10, -10), x_dir=(1, 0, 0), z_dir=(0, 0, 1))):
        Circle(CYLINDER232_R)
    extrude(amount=CYLINDER232_DEPTH)


with BuildPart() as fusion149:
    # Box152 → Box152 (new body)
    with BuildSketch(Plane(origin=(-67, -10, -7), x_dir=(1, 0, 0), z_dir=(0, 0, 1))):
        with Locations((4.25, 7)):
            Rectangle(BOX152_W, BOX152_H)
    extrude(amount=BOX152_DEPTH)

    # Fillet095
    fillet095_edges = [fusion149.edges().sort_by_distance(p)[0] for p in [
        (-62.75, -10, 4.5),
        (-62.75, 4, 4.5),
    ]]
    fillet(fillet095_edges, radius=FILLET095_R)


with BuildPart() as fusion149_1:
    # Fillet095 placement: moved
    add(fusion149.part.moved(Location((0, 3, 0))))

    # Fusion149: union Zylinder233, Zylinder232
    add(zylinder233.part)
    add(zylinder232.part)


with BuildPart() as cut104:
    # Box151 → Box151 (new body)
    with BuildSketch(Plane(origin=(-66, -13, -7), x_dir=(1, 0, 0), z_dir=(0, 0, 1))):
        with Locations((2.75, 13)):
            Rectangle(BOX151_W, BOX151_H)
    extrude(amount=BOX151_DEPTH)

    # Fillet093
    fillet093_edges = [cut104.edges().sort_by_distance(p)[0] for p in [
        (-63.25, -13, 6.5),
        (-63.25, 13, 6.5),
    ]]
    fillet(fillet093_edges, radius=FILLET093_R)

    # Cut104: cut Fusion149
    add(fusion149_1.part, mode=Mode.SUBTRACT)


with BuildPart() as w_rfel140:
    # Box150 → Box150 (new body)
    with BuildSketch(Plane(origin=(-66, -3, 6), x_dir=(1, 0, 0), z_dir=(0, 0, 1))):
        with Locations((12, 3)):
            Rectangle(BOX150_W, BOX150_H)
    extrude(amount=BOX150_DEPTH)


with BuildPart() as fillet090:
    # Box147 → Box147 (new body)
    with BuildSketch(Plane(origin=(-45, -9, 9), x_dir=(1, 0, 0), z_dir=(0, 0, 1))):
        with Locations((2, 9)):
            Rectangle(BOX147_W, BOX147_H)
    extrude(amount=BOX147_DEPTH)

    # Fillet090
    fillet090_edges = [fillet090.edges().sort_by_distance(p)[0] for p in [
        (-43, -9, 9),
        (-43, 9, 9),
    ]]
    fillet(fillet090_edges, radius=FILLET090_R)


with BuildPart() as cut152:
    # Box149 → Box149 (new body)
    with BuildSketch(Plane(origin=(-45, -3, 6), x_dir=(1, 0, 0), z_dir=(0, 0, 1))):
        with Locations((2.5, 3)):
            Rectangle(BOX149_W, BOX149_H)
    extrude(amount=BOX149_DEPTH)

    # Fusion148: union Würfel140, Fillet090
    add(w_rfel140.part)
    add(fillet090.part)

    # Fillet094
    fillet094_edges = [cut152.edges().sort_by_distance(p)[0] for p in [
        (-41, 0, 15),
    ]]
    fillet(fillet094_edges, radius=FILLET094_R)

    # Fusion150: union Cut104
    add(cut104.part)

    # Fusion157: union Cut098, Cut097, Cut099, Cut100, Cut101
    add(cut098.part)
    add(cut097.part)
    add(cut099.part)
    add(cut100_1.part)
    add(cut101.part)

    # Cut108: cut Fillet092
    add(fillet092_1.part, mode=Mode.SUBTRACT)

    # Cut151: cut Würfel228
    add(w_rfel228.part, mode=Mode.SUBTRACT)

    # Fusion219: union Fillet124, Fillet125
    add(fillet124.part)
    add(fillet125.part)

    # Cut152: cut Fusion218
    add(fusion218.part, mode=Mode.SUBTRACT)


solid = cut152.part
